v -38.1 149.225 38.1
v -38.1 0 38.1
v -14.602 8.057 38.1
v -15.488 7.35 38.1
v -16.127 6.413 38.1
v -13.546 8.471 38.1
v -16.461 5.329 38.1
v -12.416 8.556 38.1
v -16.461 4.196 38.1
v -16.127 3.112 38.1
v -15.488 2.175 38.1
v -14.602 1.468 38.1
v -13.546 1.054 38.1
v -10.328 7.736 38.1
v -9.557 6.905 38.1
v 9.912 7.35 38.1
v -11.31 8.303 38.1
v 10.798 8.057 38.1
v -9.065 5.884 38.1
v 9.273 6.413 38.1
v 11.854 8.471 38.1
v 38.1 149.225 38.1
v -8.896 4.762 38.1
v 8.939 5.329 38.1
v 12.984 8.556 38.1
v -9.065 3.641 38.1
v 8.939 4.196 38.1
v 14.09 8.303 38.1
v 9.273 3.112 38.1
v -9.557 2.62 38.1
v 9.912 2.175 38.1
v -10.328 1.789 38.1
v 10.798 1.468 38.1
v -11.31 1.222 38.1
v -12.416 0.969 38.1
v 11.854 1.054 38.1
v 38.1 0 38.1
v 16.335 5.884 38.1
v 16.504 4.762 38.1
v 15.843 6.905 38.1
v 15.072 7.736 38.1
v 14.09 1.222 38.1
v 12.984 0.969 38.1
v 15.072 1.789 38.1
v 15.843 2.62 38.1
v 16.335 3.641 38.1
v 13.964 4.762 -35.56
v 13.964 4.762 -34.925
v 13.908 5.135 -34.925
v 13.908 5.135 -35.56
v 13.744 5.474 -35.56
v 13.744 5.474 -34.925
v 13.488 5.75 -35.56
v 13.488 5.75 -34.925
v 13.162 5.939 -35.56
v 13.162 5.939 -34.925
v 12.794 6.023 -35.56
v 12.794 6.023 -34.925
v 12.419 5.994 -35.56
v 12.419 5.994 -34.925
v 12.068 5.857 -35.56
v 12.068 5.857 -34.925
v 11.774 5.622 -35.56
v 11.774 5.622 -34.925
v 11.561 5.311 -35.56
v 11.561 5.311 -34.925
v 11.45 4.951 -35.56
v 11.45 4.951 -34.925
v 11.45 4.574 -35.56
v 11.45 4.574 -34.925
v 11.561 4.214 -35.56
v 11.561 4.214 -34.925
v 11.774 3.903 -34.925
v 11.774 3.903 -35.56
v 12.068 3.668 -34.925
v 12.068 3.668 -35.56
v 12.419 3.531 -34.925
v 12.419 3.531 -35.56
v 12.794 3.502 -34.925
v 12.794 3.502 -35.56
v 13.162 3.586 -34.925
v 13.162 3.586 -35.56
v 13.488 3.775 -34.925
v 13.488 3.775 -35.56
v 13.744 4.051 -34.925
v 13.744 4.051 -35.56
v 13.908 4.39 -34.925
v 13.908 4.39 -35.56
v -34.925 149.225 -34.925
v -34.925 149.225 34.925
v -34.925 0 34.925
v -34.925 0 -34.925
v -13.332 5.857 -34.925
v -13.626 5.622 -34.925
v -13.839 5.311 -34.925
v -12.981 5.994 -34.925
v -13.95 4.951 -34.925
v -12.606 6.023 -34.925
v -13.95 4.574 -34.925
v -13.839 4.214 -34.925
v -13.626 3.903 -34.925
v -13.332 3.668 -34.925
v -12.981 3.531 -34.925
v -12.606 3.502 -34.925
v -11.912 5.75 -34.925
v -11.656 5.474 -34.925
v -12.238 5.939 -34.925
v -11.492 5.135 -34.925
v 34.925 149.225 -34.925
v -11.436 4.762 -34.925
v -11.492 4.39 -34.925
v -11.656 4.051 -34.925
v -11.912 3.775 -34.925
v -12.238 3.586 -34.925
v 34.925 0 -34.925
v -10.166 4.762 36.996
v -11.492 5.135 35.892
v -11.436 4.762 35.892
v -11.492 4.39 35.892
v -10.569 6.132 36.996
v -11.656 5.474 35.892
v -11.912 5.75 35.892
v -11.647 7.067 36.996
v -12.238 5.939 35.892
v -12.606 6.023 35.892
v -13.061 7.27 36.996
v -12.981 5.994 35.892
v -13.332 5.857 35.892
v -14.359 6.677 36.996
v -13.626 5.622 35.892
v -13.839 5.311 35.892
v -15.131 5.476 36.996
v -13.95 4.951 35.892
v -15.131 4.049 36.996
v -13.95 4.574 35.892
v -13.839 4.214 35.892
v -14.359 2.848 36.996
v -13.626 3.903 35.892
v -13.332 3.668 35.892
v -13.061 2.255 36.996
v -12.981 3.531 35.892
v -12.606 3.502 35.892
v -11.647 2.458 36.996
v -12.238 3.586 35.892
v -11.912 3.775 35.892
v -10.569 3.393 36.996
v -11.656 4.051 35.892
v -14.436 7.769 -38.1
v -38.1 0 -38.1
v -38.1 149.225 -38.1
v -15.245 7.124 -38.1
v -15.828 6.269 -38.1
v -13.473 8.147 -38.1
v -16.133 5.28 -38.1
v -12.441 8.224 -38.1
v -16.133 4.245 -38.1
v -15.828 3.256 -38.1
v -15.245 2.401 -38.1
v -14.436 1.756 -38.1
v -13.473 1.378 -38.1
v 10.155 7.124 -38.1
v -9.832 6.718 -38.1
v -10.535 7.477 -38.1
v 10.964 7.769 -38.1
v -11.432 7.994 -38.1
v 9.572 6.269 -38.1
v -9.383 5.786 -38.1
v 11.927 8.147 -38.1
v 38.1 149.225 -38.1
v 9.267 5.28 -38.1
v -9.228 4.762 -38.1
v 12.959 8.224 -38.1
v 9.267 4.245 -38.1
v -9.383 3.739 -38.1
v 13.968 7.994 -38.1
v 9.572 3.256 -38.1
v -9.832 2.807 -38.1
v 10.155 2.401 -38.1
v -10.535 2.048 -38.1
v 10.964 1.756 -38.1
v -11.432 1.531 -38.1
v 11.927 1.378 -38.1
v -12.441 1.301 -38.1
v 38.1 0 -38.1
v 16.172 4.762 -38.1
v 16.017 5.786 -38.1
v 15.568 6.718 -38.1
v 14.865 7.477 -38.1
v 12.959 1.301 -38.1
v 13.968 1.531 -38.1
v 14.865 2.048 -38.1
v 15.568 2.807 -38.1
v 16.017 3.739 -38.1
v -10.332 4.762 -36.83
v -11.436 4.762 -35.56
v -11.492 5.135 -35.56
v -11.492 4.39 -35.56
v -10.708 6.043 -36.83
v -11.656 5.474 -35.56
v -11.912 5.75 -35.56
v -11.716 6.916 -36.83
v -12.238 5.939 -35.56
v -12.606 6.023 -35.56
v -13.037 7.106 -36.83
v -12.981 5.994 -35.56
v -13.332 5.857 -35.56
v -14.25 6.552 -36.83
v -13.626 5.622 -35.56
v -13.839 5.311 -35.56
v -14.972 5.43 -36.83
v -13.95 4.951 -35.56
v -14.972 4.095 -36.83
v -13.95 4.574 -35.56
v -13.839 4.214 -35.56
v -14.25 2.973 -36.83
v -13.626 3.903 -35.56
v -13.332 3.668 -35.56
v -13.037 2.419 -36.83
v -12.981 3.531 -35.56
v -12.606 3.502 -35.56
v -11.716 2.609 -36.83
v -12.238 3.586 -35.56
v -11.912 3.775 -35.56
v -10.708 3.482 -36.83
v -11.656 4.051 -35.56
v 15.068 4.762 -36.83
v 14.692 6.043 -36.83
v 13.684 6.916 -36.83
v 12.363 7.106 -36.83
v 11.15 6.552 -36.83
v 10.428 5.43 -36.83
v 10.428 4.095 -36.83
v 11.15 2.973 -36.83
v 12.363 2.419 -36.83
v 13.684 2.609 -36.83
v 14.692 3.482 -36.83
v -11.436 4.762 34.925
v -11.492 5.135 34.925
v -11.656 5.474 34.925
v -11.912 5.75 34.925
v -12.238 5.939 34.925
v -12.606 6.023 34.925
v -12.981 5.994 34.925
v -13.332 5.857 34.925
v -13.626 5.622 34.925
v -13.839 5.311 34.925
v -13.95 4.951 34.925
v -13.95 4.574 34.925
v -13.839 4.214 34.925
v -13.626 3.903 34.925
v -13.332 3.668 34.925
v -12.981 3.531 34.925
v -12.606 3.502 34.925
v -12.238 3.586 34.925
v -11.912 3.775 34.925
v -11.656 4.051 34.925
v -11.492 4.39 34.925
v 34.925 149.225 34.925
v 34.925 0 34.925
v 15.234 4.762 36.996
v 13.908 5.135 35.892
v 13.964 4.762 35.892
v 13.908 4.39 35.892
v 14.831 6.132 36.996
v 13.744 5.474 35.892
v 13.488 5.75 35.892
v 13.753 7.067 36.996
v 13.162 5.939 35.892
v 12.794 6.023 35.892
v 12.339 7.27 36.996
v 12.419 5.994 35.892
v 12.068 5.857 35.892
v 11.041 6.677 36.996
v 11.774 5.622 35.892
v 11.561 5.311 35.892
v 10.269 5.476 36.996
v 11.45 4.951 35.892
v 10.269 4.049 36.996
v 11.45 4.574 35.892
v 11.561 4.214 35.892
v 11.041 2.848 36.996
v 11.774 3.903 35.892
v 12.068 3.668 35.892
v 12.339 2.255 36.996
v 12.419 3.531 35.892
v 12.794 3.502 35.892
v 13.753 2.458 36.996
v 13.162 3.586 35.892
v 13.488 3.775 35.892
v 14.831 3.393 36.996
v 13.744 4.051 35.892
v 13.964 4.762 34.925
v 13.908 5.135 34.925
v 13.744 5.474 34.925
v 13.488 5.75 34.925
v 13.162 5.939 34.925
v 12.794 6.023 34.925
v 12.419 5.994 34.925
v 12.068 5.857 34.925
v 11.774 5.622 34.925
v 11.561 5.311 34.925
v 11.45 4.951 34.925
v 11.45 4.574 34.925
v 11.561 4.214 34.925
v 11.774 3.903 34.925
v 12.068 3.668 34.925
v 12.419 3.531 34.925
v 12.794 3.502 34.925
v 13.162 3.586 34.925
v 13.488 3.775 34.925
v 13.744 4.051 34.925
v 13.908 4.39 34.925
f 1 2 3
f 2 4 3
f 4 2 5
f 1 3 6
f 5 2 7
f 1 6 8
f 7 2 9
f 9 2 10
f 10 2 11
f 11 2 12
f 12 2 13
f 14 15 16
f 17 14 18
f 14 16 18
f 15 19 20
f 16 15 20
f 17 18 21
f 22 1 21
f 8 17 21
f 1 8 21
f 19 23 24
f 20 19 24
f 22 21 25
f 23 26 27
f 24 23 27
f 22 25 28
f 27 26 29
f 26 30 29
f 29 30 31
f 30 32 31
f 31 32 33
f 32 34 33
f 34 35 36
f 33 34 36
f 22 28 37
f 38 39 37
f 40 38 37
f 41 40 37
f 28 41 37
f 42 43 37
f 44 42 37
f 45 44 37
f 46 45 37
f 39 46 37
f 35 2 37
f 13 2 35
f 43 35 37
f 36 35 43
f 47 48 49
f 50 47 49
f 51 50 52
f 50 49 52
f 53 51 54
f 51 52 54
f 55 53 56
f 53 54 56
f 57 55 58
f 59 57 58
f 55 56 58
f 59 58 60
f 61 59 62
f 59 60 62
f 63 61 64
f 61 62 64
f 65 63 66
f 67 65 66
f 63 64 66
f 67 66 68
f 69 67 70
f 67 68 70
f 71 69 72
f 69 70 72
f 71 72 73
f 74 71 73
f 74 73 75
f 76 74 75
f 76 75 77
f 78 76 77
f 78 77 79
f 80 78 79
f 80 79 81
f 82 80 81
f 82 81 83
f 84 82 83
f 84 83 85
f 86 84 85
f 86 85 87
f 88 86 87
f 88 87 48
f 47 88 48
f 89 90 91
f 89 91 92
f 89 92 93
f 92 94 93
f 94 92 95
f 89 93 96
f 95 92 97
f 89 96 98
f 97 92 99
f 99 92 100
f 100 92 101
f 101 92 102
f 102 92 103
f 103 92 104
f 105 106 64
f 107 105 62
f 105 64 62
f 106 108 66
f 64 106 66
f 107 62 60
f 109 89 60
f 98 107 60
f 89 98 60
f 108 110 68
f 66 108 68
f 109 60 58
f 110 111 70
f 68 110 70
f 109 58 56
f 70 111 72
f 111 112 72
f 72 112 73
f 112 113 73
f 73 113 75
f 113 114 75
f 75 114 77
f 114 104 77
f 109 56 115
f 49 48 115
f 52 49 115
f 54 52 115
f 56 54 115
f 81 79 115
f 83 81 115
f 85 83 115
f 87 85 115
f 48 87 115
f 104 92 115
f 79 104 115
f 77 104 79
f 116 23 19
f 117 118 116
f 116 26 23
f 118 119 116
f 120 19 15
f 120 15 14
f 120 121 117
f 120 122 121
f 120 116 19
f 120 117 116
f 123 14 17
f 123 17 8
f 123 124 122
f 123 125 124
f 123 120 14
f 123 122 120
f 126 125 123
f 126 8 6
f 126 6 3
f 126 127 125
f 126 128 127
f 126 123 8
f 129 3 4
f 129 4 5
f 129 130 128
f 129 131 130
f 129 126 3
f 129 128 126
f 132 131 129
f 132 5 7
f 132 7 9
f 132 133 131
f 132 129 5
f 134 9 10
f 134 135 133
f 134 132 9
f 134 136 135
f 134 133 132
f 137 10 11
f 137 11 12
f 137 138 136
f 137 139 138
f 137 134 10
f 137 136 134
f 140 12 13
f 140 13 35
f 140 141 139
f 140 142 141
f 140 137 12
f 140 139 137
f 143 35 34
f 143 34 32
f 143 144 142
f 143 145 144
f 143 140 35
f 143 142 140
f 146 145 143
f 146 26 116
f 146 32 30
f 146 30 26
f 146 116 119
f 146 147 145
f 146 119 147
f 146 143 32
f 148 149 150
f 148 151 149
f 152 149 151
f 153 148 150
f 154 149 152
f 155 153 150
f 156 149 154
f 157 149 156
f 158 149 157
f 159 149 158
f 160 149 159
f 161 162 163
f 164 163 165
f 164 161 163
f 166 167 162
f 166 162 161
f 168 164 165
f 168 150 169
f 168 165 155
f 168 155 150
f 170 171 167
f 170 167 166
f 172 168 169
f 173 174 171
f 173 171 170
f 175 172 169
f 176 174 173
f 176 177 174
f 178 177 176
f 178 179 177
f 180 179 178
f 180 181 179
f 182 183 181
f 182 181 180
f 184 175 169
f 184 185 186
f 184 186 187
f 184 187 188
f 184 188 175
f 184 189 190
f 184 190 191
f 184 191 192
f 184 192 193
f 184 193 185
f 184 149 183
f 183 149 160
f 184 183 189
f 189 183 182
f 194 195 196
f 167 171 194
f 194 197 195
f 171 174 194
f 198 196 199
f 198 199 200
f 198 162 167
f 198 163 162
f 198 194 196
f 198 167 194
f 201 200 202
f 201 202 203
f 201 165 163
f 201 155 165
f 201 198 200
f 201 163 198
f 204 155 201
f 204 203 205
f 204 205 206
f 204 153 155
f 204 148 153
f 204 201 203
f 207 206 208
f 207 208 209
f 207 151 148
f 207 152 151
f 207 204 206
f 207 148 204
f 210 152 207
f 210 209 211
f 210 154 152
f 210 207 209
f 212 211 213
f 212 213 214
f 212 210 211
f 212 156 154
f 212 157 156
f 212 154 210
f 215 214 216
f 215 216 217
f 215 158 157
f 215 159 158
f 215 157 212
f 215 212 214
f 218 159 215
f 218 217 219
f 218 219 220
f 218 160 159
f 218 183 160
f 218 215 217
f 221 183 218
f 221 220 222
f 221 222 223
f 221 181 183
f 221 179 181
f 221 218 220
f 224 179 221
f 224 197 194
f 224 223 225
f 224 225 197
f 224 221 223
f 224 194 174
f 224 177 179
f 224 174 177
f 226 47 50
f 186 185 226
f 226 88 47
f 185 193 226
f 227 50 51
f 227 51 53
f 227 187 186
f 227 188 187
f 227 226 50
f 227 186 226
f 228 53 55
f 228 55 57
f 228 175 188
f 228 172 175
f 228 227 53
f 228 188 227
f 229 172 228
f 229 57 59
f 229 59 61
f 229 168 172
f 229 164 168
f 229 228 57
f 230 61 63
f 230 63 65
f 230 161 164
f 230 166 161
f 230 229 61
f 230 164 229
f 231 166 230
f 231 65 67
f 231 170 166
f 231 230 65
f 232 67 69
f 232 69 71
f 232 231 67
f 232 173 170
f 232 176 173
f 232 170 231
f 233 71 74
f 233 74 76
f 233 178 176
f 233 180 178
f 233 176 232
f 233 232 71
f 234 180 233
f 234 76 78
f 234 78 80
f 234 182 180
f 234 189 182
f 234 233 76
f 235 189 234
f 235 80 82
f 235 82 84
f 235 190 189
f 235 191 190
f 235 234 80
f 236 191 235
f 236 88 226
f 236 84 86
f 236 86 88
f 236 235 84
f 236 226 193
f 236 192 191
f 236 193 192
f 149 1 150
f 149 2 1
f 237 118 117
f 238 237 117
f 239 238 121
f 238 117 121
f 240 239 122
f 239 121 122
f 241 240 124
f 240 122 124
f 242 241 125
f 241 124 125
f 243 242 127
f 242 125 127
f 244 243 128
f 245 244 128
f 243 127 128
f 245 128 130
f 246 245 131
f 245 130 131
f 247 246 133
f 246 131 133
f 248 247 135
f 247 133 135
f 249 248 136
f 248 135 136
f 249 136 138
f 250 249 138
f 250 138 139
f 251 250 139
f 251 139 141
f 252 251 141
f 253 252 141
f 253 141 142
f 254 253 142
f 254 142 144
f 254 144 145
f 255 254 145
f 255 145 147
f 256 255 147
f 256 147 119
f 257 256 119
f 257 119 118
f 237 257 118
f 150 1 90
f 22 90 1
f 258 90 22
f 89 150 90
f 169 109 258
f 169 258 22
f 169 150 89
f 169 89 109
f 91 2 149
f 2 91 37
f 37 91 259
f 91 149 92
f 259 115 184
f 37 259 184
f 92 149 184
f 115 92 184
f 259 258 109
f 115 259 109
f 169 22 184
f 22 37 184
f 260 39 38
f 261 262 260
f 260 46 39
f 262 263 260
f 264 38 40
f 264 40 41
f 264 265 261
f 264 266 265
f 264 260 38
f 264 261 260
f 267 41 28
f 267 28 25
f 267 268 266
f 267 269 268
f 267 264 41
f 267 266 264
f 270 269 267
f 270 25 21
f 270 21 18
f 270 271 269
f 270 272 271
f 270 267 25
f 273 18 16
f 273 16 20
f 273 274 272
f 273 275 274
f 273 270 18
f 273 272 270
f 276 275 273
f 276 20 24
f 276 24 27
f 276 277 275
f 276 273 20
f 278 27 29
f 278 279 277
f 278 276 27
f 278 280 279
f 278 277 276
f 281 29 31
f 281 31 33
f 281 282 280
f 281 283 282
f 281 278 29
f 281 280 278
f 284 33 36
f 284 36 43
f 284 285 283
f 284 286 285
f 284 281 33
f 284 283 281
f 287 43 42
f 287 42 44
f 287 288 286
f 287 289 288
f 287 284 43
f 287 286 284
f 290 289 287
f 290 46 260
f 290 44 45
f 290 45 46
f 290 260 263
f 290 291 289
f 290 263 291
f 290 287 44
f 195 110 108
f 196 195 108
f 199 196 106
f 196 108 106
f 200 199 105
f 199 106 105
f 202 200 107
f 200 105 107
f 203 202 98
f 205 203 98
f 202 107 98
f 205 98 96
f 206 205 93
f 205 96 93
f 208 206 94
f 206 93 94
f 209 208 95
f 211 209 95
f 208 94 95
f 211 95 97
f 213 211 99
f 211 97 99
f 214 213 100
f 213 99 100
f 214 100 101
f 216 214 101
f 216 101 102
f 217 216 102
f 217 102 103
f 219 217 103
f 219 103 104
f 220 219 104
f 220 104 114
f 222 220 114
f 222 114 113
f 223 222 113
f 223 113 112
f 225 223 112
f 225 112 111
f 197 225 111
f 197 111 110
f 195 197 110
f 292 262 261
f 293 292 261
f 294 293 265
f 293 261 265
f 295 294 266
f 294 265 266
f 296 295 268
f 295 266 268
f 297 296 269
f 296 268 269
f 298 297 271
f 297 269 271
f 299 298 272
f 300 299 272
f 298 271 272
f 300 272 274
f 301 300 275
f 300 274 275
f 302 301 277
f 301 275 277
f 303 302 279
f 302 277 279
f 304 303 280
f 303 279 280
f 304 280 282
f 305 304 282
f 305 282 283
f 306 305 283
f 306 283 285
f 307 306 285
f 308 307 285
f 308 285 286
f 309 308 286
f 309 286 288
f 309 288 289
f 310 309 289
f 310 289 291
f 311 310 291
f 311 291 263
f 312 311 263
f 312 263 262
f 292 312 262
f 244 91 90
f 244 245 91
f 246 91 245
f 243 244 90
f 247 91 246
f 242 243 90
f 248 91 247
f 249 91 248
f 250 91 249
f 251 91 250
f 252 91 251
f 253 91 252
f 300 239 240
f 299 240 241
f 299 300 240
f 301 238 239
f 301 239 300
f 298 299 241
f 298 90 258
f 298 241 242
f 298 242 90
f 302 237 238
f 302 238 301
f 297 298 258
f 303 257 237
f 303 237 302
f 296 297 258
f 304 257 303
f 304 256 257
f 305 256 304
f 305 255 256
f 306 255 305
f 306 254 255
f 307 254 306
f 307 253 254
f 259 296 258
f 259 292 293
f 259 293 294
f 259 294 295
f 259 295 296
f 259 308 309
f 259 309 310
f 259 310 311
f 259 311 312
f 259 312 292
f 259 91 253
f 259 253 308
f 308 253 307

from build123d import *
from OCP.BRepFilletAPI import BRepFilletAPI_MakeChamfer

# Parameters (mm, degrees)
SKETCH1_W           = 76.2
SKETCH1_H           = 76.2
SKETCH1_W_2         = 69.85
SKETCH1_H_2         = 69.85
BOSS_EXTRUDE1_DEPTH = 9.525
SKETCH2_R           = 1.26365
CUT_EXTRUDE1_DEPTH  = 86.725
CHAMFER1_SIZE       = 2.54
CHAMFER1_SIZE2      = 2.207988314
SKETCH3_W           = 76.2
SKETCH3_H           = 76.2
SKETCH3_W_2         = 69.85
SKETCH3_H_2         = 69.85
BOSS_EXTRUDE2_DEPTH = 139.7


with BuildPart() as part:
    # Sketch1 → Boss-Extrude1 (new body)
    with BuildSketch(Plane(origin=(0, 0, 0), x_dir=(1, 0, 0), z_dir=(0, 1, 0))):
        Rectangle(SKETCH1_W, SKETCH1_H)
        Rectangle(SKETCH1_W_2, SKETCH1_H_2, mode=Mode.SUBTRACT)
    extrude(amount=BOSS_EXTRUDE1_DEPTH)

    # Sketch2 → Cut-Extrude1 (cut, through all)
    with BuildSketch(Plane.XY.offset(38.1)):
        with Locations((-12.7, 4.7625)):
            Circle(SKETCH2_R)
        with Locations((12.7, 4.7625)):
            Circle(SKETCH2_R)
    extrude(amount=-CUT_EXTRUDE1_DEPTH, mode=Mode.SUBTRACT)

    # Chamfer1: one chamfer whose edges measure the first distance from different faces: ONE call of the kernel's chamfer builder (chamfer() names one face for all edges)
    chamfer1_edges_1 = [part.edges().sort_by_distance(p)[0] for p in [
        (-13.96365, 4.7625, -38.1),
    ]]
    chamfer1_side_1 = [part.faces().sort_by_distance(p)[0] for p in [
        (-13.96365, 4.7625, -36.5125),
    ]]
    chamfer1_edges_2 = [part.edges().sort_by_distance(p)[0] for p in [
        (-13.96365, 4.7625, 38.1),
        (11.43635, 4.7625, 38.1),
    ]]
    chamfer1_side_2 = [part.faces().sort_by_distance(p)[0] for p in [
        (0, 4.7625, 38.1),
    ]]
    chamfer1_edges_3 = [part.edges().sort_by_distance(p)[0] for p in [
        (11.43635, 4.7625, -38.1),
    ]]
    chamfer1_side_3 = [part.faces().sort_by_distance(p)[0] for p in [
        (11.43635, 4.7625, -36.5125),
    ]]
    chamfer1 = BRepFilletAPI_MakeChamfer(part.part.solid().wrapped)
    for e in chamfer1_edges_1:
        chamfer1.Add(CHAMFER1_SIZE, CHAMFER1_SIZE2, e.wrapped, chamfer1_side_1[0].wrapped)  # the first distance lies on this face
    for e in chamfer1_edges_2:
        chamfer1.Add(CHAMFER1_SIZE, CHAMFER1_SIZE2, e.wrapped, chamfer1_side_2[0].wrapped)  # the first distance lies on this face
    for e in chamfer1_edges_3:
        chamfer1.Add(CHAMFER1_SIZE, CHAMFER1_SIZE2, e.wrapped, chamfer1_side_3[0].wrapped)  # the first distance lies on this face
    add(Compound.cast(chamfer1.Shape()), mode=Mode.REPLACE)

    # Sketch3 → Boss-Extrude2 (add)
    with BuildSketch(Plane(origin=(0, 9.525, 0), x_dir=(1, 0, 0), z_dir=(0, 1, 0))):
        Rectangle(SKETCH3_W, SKETCH3_H)
        Rectangle(SKETCH3_W_2, SKETCH3_H_2, mode=Mode.SUBTRACT)
    extrude(amount=BOSS_EXTRUDE2_DEPTH)


solid = part.part
